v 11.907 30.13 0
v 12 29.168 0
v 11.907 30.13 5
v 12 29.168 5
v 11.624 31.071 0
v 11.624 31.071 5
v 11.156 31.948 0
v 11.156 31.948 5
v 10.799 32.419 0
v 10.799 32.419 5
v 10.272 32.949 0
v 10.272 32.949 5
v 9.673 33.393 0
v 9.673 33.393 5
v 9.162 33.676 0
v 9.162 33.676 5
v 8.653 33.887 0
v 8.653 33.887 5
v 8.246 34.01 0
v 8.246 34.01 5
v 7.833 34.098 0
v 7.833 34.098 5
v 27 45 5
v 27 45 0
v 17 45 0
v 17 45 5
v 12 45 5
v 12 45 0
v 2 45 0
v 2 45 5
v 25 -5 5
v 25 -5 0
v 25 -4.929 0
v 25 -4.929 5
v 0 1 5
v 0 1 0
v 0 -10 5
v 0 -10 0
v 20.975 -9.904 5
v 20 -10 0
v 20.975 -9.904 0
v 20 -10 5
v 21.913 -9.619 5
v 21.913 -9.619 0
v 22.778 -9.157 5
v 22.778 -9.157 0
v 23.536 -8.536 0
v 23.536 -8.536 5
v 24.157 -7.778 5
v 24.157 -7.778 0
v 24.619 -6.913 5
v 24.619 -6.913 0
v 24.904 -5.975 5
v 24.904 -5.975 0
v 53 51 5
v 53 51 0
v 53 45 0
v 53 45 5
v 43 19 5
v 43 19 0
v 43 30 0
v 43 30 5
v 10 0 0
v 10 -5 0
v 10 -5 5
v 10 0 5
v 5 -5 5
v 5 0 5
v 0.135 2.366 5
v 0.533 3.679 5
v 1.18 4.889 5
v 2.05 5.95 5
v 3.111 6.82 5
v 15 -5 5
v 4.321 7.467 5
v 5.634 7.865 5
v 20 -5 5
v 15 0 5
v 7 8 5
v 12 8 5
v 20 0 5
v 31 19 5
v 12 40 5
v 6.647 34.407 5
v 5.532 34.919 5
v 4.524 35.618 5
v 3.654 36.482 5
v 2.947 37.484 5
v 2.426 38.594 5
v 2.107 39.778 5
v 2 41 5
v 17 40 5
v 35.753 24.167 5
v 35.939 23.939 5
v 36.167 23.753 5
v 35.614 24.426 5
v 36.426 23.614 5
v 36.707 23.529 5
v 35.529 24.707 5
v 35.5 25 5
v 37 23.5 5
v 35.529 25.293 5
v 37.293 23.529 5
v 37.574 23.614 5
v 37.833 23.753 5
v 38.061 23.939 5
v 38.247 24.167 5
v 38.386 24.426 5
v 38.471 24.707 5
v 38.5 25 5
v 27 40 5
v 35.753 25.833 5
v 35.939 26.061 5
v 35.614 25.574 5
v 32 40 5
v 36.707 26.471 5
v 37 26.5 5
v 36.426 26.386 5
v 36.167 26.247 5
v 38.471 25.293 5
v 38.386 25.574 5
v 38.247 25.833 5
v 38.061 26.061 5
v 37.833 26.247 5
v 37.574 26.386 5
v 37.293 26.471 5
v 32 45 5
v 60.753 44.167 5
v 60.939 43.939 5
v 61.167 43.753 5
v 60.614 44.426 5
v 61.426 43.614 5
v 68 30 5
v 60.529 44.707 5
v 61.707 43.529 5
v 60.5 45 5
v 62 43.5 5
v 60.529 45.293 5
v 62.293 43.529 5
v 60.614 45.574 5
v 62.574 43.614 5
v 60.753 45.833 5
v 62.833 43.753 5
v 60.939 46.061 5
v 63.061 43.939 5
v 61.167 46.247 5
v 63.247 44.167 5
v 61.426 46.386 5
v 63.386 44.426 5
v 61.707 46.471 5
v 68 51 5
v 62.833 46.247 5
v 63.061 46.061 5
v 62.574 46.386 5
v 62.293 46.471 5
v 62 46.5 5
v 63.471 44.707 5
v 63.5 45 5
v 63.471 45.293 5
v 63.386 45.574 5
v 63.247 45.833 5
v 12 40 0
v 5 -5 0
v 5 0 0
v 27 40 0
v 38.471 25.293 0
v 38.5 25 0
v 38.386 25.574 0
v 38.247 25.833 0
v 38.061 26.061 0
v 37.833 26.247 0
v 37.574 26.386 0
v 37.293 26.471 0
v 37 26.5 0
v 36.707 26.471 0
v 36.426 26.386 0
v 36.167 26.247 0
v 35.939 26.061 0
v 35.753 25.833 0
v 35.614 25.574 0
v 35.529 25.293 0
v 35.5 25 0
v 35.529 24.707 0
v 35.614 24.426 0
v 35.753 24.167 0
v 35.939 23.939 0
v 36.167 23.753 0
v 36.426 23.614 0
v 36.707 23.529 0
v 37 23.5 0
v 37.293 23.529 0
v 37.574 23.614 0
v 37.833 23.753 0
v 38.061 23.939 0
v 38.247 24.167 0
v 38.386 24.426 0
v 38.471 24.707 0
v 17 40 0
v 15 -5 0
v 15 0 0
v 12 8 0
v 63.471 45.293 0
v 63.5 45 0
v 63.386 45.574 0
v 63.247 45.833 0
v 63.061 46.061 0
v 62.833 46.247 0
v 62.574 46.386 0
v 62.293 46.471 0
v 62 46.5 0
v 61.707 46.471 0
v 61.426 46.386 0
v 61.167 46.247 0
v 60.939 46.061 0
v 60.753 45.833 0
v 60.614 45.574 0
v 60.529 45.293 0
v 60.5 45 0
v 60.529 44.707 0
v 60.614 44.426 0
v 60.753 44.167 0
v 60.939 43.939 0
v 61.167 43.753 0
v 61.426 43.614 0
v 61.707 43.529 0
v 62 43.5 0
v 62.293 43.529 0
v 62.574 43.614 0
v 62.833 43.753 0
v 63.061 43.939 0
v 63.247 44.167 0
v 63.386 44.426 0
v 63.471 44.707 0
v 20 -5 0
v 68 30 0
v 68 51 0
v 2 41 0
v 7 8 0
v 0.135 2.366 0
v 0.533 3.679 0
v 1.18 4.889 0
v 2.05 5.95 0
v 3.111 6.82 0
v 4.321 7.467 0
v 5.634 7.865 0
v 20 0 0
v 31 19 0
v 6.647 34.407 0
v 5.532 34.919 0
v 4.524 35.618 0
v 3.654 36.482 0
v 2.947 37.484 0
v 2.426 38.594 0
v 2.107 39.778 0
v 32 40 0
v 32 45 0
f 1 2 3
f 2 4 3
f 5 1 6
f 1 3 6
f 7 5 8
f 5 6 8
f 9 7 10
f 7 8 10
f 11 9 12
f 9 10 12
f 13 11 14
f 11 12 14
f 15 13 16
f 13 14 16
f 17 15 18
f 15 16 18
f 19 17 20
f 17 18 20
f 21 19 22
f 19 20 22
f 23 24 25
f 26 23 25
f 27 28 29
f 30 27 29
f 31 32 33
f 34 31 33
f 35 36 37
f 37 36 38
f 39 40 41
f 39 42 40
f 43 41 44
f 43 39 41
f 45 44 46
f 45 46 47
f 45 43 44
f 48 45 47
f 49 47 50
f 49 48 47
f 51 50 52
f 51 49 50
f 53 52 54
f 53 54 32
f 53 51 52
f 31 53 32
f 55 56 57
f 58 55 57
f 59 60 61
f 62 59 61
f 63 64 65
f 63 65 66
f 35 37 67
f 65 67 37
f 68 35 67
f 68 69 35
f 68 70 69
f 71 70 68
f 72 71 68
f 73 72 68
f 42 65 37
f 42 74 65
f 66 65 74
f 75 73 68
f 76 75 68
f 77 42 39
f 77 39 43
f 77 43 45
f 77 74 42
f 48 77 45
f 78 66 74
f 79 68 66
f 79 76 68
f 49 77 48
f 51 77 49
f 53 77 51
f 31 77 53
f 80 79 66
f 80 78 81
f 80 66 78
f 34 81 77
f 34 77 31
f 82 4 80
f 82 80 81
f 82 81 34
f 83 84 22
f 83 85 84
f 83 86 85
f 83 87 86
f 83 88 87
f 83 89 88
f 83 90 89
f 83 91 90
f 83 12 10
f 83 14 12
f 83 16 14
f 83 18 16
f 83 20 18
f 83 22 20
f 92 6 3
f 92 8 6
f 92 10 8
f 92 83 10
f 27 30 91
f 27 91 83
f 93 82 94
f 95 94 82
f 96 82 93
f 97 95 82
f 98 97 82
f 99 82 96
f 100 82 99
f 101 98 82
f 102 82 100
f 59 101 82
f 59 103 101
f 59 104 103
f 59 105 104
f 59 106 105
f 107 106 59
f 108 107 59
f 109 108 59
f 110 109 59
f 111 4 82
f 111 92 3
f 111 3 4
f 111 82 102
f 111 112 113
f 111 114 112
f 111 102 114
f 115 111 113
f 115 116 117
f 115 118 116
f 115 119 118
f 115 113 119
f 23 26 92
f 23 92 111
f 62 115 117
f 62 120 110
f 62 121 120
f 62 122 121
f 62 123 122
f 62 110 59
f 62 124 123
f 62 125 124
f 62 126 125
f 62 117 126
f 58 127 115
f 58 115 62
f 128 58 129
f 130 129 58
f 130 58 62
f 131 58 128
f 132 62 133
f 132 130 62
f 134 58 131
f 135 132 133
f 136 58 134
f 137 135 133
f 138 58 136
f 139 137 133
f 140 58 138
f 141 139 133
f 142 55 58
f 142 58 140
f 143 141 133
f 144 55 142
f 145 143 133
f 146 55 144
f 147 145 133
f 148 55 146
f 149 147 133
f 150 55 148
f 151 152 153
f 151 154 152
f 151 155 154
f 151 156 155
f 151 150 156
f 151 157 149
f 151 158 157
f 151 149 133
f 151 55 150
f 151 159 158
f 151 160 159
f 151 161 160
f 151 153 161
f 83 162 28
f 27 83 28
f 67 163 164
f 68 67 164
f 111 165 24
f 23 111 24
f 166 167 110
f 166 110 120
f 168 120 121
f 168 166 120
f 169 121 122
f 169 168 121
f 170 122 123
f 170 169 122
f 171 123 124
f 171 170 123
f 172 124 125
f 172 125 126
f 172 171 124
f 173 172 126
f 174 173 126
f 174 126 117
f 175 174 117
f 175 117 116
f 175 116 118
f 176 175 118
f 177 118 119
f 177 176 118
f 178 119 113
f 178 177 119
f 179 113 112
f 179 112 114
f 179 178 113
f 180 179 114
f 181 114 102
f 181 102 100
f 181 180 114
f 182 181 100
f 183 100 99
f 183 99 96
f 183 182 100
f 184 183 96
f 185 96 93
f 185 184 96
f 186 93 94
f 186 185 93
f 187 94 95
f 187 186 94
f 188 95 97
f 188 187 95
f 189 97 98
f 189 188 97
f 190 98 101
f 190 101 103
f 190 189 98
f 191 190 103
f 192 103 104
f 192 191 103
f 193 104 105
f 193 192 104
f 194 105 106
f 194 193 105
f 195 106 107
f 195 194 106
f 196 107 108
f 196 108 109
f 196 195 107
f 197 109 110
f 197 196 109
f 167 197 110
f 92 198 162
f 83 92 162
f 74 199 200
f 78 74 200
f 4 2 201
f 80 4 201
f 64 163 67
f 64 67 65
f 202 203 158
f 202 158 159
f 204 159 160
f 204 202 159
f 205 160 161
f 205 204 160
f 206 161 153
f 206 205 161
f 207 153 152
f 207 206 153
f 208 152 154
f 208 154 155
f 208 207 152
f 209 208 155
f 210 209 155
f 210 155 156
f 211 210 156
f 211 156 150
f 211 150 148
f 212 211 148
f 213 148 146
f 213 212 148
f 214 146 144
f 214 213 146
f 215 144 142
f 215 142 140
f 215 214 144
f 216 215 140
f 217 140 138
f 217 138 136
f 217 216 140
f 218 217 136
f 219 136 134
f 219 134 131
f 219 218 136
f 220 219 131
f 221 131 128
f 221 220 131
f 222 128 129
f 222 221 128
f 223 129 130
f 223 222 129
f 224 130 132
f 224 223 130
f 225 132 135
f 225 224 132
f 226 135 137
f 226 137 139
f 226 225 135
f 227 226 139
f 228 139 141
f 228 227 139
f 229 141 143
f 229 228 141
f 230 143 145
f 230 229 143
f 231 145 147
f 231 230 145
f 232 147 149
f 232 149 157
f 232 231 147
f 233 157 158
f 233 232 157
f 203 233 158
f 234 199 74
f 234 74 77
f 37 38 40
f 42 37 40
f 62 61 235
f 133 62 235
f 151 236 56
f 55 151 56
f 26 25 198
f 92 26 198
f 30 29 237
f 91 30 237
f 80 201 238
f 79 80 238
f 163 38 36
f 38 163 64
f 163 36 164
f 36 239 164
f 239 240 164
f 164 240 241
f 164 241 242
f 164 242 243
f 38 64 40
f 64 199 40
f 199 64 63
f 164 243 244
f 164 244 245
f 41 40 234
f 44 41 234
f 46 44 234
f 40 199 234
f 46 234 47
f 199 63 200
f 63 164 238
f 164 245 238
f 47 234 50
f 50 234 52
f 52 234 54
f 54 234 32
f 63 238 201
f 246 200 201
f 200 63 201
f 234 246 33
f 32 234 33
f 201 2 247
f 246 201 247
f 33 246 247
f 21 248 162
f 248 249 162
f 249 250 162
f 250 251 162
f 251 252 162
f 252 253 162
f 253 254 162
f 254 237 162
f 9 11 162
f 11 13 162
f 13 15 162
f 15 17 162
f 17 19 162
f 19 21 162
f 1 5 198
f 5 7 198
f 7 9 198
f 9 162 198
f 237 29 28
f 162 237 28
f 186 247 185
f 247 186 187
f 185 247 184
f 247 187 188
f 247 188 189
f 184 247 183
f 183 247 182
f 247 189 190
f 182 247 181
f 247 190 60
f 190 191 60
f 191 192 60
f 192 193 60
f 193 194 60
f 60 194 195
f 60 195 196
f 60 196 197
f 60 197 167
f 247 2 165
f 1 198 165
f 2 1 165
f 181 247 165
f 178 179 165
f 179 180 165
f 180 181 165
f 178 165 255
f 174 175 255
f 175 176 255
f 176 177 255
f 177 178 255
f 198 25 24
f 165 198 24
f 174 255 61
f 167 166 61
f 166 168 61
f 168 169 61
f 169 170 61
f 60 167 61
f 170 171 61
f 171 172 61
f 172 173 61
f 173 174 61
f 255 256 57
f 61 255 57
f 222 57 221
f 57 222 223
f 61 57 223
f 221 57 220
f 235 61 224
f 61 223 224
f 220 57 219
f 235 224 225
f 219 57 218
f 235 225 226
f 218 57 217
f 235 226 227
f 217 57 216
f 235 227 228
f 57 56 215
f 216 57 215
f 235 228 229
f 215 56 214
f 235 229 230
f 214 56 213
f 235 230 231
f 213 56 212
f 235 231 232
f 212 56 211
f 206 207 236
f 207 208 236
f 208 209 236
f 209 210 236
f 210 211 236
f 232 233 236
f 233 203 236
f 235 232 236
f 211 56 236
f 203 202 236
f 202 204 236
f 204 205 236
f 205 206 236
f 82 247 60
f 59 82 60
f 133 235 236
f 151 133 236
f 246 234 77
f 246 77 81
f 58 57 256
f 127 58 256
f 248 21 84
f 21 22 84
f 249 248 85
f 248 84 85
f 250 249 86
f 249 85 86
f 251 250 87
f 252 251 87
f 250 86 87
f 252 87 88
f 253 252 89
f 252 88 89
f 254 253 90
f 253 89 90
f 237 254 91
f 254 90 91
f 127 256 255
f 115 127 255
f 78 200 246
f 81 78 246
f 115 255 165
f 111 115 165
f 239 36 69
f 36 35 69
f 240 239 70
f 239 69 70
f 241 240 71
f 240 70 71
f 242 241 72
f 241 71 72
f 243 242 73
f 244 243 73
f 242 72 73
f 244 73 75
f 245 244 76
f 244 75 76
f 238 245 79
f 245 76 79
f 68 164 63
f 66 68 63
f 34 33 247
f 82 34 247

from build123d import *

# Parameters (mm, degrees)
ESQUISSE1_R        = 1.5
ESQUISSE1_W        = 5
ESQUISSE1_H        = 5
BOSS_EXTRU_1_DEPTH = 5
CONG_1_R           = 7
CONG_2_R           = 5
CONG_3_R           = 5


with BuildPart() as part:
    # Esquisse1 → Boss.-Extru.1 (new body)
    with BuildSketch(Plane.XY):
        Polygon((31, 19), (43, 19), (43, 30), (68, 30), (68, 51), (53, 51), (53, 45), (32, 45), (32, 40), (27, 40), (27, 45), (17, 45), (17, 40), (12, 40), (12, 45), (2, 45), (2, 40), (2, 34), (12, 34), (12, 8), (0, 8), (0, 0), (0, -5.810046935), (0, -10), (25, -10), (25, -4.928993292), align=None)
        with Locations((62, 45)):
            Circle(ESQUISSE1_R, mode=Mode.SUBTRACT)
        with Locations((37, 25)):
            Circle(ESQUISSE1_R, mode=Mode.SUBTRACT)
        with Locations((7.5, -2.5)):
            Rectangle(ESQUISSE1_W, ESQUISSE1_H, mode=Mode.SUBTRACT)
        with Locations((17.5, -2.5)):
            Rectangle(ESQUISSE1_W, ESQUISSE1_H, mode=Mode.SUBTRACT)
    extrude(amount=BOSS_EXTRU_1_DEPTH)

    # Congé1
    cong_1_edges = [part.edges().sort_by_distance(p)[0] for p in [
        (0, 8, 2.5),
        (2, 34, 2.5),
    ]]
    fillet(cong_1_edges, radius=CONG_1_R)

    # Congé2
    cong_2_edges = [part.edges().sort_by_distance(p)[0] for p in [
        (12, 34, 2.5),
    ]]
    fillet(cong_2_edges, radius=CONG_2_R)

    # Congé3
    cong_3_edges = [part.edges().sort_by_distance(p)[0] for p in [
        (25, -10, 2.5),
    ]]
    fillet(cong_3_edges, radius=CONG_3_R)


solid = part.part
